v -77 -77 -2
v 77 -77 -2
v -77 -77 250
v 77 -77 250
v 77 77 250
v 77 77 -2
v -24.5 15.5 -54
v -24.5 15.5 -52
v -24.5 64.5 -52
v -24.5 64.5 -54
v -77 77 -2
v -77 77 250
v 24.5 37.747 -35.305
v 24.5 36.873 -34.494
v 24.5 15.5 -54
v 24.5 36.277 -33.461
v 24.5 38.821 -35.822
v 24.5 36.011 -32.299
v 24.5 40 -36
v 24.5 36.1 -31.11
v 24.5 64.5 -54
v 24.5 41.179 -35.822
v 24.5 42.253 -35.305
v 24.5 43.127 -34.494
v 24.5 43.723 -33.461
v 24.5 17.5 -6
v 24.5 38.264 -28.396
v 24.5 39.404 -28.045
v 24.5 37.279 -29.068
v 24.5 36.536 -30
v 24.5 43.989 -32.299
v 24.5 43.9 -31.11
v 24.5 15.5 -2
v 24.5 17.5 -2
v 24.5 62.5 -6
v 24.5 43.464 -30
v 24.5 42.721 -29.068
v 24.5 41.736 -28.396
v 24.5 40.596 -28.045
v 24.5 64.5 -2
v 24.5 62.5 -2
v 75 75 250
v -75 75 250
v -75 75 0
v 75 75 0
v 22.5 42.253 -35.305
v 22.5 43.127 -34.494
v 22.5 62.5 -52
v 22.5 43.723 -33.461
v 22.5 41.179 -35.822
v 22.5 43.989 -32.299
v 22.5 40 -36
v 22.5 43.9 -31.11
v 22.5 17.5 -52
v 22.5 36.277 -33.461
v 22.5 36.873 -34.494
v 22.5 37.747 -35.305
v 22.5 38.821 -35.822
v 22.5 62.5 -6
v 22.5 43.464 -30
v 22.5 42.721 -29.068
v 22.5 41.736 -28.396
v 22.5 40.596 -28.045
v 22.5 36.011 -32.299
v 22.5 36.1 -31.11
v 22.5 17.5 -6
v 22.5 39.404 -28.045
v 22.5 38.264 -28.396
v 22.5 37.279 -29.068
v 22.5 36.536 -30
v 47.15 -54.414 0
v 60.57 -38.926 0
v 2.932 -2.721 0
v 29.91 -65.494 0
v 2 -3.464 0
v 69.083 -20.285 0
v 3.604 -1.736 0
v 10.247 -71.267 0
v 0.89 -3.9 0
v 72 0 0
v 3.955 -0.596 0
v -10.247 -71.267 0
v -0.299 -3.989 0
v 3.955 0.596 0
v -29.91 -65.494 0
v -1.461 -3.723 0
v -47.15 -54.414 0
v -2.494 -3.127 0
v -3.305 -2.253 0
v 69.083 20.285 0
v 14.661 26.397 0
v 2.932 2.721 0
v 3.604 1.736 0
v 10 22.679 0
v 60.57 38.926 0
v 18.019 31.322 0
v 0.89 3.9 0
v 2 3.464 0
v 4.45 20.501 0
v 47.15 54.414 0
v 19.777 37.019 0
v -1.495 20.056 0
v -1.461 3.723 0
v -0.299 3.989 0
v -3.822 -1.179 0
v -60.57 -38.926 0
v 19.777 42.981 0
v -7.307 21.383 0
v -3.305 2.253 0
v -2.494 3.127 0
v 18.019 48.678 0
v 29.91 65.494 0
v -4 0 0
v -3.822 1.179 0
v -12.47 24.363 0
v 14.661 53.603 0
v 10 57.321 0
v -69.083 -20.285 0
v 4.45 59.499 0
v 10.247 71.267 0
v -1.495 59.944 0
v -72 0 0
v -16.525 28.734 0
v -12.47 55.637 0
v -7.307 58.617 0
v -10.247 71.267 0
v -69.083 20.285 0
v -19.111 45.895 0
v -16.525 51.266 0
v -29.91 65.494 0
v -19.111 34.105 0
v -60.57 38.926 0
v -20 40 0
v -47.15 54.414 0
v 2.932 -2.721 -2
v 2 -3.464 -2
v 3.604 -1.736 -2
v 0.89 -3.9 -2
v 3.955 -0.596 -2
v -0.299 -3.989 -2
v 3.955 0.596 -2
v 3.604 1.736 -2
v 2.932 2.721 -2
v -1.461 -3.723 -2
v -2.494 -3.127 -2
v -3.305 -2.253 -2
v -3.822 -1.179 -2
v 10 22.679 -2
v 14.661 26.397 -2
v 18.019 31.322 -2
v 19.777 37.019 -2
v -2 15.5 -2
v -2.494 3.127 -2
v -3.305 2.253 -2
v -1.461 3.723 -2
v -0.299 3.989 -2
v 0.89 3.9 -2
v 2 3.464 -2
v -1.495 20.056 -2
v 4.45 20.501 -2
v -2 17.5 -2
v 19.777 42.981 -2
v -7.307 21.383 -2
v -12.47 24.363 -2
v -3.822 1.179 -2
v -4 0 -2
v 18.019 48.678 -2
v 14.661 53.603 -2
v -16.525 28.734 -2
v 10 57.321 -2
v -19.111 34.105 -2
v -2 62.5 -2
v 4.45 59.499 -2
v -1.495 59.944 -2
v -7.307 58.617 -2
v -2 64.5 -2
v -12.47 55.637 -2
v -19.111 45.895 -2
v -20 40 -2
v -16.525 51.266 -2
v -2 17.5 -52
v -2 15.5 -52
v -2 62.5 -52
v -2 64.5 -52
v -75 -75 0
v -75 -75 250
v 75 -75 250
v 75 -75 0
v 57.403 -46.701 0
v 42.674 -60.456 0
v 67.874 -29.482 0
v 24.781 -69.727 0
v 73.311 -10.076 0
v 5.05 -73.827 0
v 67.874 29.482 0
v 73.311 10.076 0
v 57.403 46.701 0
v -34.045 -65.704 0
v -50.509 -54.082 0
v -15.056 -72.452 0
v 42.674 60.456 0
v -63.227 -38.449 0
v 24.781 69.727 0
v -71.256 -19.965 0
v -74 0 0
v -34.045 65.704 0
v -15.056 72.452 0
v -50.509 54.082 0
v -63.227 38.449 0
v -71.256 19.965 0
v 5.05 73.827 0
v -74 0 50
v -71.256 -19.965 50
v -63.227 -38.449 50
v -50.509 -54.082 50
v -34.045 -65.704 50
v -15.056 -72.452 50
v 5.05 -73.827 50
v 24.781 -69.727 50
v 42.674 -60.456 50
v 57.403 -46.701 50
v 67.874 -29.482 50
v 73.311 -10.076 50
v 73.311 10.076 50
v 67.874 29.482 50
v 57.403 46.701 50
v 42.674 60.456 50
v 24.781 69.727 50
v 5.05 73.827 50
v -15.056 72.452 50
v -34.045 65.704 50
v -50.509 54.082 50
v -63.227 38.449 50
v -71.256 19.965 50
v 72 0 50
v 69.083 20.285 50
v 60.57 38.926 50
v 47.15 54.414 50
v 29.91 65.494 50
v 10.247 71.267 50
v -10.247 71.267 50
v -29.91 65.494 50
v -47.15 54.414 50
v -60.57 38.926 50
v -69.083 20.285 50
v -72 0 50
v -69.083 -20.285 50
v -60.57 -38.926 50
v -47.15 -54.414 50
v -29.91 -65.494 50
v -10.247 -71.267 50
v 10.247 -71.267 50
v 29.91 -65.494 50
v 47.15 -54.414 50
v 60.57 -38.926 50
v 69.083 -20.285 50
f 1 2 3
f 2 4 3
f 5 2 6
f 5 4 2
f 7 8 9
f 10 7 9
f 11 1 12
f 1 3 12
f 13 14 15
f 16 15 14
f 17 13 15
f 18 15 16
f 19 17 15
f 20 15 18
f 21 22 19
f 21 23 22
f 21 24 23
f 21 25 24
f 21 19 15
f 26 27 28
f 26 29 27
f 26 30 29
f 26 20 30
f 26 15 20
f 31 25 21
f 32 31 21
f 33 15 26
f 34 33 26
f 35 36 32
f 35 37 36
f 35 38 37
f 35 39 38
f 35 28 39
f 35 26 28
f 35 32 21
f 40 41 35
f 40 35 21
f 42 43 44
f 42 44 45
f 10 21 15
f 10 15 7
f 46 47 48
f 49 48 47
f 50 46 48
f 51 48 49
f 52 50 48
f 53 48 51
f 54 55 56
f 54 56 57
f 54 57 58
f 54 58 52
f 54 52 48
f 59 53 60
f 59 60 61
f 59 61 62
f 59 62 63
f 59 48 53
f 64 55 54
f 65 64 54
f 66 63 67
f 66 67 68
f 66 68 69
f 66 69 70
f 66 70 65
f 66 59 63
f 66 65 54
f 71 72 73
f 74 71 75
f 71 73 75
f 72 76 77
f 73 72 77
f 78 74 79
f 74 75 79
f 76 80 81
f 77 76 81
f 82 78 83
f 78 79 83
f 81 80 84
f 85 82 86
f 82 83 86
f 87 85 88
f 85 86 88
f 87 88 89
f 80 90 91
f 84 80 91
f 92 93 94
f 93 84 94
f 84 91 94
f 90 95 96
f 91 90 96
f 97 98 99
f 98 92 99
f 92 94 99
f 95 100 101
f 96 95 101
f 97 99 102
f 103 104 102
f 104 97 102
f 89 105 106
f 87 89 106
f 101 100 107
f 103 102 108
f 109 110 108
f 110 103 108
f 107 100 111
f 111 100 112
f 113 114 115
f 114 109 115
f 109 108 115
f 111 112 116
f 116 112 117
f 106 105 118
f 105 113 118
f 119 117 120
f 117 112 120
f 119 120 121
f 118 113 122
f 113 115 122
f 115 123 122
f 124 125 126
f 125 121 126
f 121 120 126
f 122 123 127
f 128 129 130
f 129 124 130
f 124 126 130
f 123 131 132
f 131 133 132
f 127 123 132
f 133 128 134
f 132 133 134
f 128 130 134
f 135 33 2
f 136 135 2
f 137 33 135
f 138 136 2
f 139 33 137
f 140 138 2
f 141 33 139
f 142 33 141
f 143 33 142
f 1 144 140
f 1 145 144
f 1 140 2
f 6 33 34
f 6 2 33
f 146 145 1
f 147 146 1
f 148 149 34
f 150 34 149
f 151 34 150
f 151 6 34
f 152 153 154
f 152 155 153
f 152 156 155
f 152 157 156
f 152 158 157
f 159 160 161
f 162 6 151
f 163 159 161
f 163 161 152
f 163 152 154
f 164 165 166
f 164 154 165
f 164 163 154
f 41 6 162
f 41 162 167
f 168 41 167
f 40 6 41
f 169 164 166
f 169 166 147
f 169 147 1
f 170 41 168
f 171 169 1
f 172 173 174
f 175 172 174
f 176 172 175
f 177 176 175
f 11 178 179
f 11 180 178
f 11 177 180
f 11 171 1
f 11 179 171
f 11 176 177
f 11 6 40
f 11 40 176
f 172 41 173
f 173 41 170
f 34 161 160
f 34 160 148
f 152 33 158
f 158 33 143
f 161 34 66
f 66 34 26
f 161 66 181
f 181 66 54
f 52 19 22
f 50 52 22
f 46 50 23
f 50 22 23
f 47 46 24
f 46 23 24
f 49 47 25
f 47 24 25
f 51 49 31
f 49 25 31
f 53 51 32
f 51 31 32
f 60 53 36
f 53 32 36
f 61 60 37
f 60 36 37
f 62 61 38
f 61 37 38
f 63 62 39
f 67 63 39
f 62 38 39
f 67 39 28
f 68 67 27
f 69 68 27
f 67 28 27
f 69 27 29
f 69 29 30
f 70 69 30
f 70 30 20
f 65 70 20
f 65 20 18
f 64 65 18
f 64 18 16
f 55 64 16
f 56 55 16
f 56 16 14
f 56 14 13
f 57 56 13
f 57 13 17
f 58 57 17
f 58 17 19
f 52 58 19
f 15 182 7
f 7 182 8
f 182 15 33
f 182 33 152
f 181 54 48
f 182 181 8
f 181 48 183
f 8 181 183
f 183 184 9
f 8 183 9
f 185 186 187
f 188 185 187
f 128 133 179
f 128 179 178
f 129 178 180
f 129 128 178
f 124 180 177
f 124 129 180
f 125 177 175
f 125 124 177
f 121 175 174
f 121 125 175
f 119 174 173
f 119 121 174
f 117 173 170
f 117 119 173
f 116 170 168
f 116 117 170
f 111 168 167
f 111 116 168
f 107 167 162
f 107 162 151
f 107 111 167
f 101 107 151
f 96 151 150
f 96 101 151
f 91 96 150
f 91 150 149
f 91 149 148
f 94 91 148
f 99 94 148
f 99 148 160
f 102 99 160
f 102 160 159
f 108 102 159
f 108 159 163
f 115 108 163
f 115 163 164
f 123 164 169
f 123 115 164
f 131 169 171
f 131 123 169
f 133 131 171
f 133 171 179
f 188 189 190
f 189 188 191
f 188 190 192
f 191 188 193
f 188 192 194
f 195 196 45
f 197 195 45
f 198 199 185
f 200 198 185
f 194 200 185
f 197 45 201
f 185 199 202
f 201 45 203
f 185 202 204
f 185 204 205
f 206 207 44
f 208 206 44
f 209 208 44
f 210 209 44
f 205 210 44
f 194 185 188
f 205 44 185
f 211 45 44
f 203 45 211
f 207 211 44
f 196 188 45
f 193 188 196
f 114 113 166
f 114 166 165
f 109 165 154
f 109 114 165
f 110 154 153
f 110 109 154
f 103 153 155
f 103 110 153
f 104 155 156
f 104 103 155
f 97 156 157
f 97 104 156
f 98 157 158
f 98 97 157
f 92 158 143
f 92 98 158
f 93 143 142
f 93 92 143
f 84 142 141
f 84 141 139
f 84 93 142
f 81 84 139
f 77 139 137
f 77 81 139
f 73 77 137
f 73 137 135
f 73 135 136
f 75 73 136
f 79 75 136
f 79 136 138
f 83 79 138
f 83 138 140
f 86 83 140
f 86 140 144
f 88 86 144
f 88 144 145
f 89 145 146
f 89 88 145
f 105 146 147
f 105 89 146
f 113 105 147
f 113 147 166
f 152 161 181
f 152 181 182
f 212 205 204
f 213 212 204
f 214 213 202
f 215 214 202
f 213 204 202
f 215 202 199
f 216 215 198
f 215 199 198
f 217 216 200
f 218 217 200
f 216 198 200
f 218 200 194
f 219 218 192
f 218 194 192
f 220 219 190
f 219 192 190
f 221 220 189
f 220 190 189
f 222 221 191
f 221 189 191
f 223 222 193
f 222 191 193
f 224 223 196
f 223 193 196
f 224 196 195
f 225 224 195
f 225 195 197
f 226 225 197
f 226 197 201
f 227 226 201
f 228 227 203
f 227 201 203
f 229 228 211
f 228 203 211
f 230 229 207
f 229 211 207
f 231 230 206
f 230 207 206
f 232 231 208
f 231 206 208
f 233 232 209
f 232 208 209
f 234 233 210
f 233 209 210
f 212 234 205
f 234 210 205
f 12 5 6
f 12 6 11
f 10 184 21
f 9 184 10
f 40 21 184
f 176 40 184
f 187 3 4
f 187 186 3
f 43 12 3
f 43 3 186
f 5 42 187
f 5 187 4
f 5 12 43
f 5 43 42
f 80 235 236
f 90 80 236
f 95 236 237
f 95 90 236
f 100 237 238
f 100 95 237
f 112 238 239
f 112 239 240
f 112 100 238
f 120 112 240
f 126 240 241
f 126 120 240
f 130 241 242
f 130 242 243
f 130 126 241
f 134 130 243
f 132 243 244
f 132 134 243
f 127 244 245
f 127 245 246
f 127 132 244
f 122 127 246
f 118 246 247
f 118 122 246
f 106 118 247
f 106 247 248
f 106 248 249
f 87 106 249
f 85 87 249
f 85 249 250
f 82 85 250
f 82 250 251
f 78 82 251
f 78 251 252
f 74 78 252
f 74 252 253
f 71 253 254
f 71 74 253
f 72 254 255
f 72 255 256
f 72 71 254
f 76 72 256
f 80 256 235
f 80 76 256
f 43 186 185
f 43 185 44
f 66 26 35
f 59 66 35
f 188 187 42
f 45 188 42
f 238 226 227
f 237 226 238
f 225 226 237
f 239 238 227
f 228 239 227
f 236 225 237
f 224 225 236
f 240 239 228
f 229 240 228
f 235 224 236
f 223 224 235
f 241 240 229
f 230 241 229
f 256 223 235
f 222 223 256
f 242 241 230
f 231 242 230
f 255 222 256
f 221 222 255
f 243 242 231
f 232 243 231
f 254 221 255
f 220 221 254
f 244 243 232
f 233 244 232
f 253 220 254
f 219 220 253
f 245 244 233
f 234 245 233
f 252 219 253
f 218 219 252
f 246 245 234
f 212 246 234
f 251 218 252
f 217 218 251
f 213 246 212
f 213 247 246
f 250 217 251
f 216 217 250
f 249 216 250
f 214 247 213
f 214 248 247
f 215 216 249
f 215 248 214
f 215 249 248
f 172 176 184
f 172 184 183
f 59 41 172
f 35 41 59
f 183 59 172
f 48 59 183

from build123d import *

# Parameters (mm, degrees)
SKETCH1_W           = 154
SKETCH1_H           = 154
SKETCH1_W_2         = 150
SKETCH1_H_2         = 150
BOSS_EXTRUDE1_DEPTH = 250
SKETCH2_W           = 154
SKETCH2_H           = 154
SKETCH2_R           = 20
SKETCH2_R_2         = 4
BOSS_EXTRUDE2_DEPTH = 2
BOSS_EXTRUDE3_DEPTH = 50
SKETCH4_W           = 49
SKETCH4_H           = 49
BOSS_EXTRUDE4_DEPTH = 2
SKETCH5_W           = 4
SKETCH5_H           = 45
CUT_EXTRUDE1_DEPTH  = 2
SKETCH6_R           = 4
CUT_EXTRUDE2_DEPTH  = 70
SKETCH9_R           = 74
SKETCH9_R_2         = 72
BOSS_EXTRUDE9_DEPTH = 50


with BuildPart() as part:
    # Sketch1 → Boss-Extrude1 (new body)
    with BuildSketch(Plane.XY):
        Rectangle(SKETCH1_W, SKETCH1_H)
        Rectangle(SKETCH1_W_2, SKETCH1_H_2, mode=Mode.SUBTRACT)
    extrude(amount=BOSS_EXTRUDE1_DEPTH)

    # Sketch2 → Boss-Extrude2 (add)
    with BuildSketch(Plane(origin=(0, 0, 0), x_dir=(-1, 0, 0), z_dir=(0, 0, -1))):
        Rectangle(SKETCH2_W, SKETCH2_H)
        with Locations((0, 40)):
            Circle(SKETCH2_R, mode=Mode.SUBTRACT)
        Circle(SKETCH2_R_2, mode=Mode.SUBTRACT)
    extrude(amount=BOSS_EXTRUDE2_DEPTH)

    # Sketch3 → Boss-Extrude3 (add)
    with BuildSketch(Plane(origin=(0, 0, -2), x_dir=(-1, 0, 0), z_dir=(0, 0, -1))):
        Polygon((2, 64.5), (2, 62.5), (0, 62.5), (-22.5, 62.5), (-22.5, 17.5), (0, 17.5), (2, 17.5), (2, 15.5), (-24.5, 15.5), (-24.5, 64.5), align=None)
    extrude(amount=BOSS_EXTRUDE3_DEPTH)

    # Sketch4 → Boss-Extrude4 (add)
    with BuildSketch(Plane(origin=(0, 0, -52), x_dir=(-1, 0, 0), z_dir=(0, 0, -1))):
        with Locations((0, 40)):
            Rectangle(SKETCH4_W, SKETCH4_H)
    extrude(amount=BOSS_EXTRUDE4_DEPTH)

    # Sketch5 → Cut-Extrude1 (cut)
    with BuildSketch(Plane(origin=(24.5, 0, 0), x_dir=(0, 0, -1), z_dir=(1, 0, 0))):
        with Locations((4, 40)):
            Rectangle(SKETCH5_W, SKETCH5_H)
    extrude(amount=-CUT_EXTRUDE1_DEPTH, mode=Mode.SUBTRACT)

    # Sketch6 → Cut-Extrude2 (cut)
    with BuildSketch(Plane(origin=(24.5, 0, 0), x_dir=(0, 0, -1), z_dir=(1, 0, 0))):
        with Locations((32, 40)):
            Circle(SKETCH6_R)
    extrude(amount=-CUT_EXTRUDE2_DEPTH, mode=Mode.SUBTRACT)

    # Sketch9 → Boss-Extrude9 (add)
    with BuildSketch(Plane.XY):
        with Locations(Location((0, 0, 0), (0, 0, 180))):
            Circle(SKETCH9_R)
        Circle(SKETCH9_R_2, mode=Mode.SUBTRACT)
    extrude(amount=BOSS_EXTRUDE9_DEPTH)


solid = part.part
